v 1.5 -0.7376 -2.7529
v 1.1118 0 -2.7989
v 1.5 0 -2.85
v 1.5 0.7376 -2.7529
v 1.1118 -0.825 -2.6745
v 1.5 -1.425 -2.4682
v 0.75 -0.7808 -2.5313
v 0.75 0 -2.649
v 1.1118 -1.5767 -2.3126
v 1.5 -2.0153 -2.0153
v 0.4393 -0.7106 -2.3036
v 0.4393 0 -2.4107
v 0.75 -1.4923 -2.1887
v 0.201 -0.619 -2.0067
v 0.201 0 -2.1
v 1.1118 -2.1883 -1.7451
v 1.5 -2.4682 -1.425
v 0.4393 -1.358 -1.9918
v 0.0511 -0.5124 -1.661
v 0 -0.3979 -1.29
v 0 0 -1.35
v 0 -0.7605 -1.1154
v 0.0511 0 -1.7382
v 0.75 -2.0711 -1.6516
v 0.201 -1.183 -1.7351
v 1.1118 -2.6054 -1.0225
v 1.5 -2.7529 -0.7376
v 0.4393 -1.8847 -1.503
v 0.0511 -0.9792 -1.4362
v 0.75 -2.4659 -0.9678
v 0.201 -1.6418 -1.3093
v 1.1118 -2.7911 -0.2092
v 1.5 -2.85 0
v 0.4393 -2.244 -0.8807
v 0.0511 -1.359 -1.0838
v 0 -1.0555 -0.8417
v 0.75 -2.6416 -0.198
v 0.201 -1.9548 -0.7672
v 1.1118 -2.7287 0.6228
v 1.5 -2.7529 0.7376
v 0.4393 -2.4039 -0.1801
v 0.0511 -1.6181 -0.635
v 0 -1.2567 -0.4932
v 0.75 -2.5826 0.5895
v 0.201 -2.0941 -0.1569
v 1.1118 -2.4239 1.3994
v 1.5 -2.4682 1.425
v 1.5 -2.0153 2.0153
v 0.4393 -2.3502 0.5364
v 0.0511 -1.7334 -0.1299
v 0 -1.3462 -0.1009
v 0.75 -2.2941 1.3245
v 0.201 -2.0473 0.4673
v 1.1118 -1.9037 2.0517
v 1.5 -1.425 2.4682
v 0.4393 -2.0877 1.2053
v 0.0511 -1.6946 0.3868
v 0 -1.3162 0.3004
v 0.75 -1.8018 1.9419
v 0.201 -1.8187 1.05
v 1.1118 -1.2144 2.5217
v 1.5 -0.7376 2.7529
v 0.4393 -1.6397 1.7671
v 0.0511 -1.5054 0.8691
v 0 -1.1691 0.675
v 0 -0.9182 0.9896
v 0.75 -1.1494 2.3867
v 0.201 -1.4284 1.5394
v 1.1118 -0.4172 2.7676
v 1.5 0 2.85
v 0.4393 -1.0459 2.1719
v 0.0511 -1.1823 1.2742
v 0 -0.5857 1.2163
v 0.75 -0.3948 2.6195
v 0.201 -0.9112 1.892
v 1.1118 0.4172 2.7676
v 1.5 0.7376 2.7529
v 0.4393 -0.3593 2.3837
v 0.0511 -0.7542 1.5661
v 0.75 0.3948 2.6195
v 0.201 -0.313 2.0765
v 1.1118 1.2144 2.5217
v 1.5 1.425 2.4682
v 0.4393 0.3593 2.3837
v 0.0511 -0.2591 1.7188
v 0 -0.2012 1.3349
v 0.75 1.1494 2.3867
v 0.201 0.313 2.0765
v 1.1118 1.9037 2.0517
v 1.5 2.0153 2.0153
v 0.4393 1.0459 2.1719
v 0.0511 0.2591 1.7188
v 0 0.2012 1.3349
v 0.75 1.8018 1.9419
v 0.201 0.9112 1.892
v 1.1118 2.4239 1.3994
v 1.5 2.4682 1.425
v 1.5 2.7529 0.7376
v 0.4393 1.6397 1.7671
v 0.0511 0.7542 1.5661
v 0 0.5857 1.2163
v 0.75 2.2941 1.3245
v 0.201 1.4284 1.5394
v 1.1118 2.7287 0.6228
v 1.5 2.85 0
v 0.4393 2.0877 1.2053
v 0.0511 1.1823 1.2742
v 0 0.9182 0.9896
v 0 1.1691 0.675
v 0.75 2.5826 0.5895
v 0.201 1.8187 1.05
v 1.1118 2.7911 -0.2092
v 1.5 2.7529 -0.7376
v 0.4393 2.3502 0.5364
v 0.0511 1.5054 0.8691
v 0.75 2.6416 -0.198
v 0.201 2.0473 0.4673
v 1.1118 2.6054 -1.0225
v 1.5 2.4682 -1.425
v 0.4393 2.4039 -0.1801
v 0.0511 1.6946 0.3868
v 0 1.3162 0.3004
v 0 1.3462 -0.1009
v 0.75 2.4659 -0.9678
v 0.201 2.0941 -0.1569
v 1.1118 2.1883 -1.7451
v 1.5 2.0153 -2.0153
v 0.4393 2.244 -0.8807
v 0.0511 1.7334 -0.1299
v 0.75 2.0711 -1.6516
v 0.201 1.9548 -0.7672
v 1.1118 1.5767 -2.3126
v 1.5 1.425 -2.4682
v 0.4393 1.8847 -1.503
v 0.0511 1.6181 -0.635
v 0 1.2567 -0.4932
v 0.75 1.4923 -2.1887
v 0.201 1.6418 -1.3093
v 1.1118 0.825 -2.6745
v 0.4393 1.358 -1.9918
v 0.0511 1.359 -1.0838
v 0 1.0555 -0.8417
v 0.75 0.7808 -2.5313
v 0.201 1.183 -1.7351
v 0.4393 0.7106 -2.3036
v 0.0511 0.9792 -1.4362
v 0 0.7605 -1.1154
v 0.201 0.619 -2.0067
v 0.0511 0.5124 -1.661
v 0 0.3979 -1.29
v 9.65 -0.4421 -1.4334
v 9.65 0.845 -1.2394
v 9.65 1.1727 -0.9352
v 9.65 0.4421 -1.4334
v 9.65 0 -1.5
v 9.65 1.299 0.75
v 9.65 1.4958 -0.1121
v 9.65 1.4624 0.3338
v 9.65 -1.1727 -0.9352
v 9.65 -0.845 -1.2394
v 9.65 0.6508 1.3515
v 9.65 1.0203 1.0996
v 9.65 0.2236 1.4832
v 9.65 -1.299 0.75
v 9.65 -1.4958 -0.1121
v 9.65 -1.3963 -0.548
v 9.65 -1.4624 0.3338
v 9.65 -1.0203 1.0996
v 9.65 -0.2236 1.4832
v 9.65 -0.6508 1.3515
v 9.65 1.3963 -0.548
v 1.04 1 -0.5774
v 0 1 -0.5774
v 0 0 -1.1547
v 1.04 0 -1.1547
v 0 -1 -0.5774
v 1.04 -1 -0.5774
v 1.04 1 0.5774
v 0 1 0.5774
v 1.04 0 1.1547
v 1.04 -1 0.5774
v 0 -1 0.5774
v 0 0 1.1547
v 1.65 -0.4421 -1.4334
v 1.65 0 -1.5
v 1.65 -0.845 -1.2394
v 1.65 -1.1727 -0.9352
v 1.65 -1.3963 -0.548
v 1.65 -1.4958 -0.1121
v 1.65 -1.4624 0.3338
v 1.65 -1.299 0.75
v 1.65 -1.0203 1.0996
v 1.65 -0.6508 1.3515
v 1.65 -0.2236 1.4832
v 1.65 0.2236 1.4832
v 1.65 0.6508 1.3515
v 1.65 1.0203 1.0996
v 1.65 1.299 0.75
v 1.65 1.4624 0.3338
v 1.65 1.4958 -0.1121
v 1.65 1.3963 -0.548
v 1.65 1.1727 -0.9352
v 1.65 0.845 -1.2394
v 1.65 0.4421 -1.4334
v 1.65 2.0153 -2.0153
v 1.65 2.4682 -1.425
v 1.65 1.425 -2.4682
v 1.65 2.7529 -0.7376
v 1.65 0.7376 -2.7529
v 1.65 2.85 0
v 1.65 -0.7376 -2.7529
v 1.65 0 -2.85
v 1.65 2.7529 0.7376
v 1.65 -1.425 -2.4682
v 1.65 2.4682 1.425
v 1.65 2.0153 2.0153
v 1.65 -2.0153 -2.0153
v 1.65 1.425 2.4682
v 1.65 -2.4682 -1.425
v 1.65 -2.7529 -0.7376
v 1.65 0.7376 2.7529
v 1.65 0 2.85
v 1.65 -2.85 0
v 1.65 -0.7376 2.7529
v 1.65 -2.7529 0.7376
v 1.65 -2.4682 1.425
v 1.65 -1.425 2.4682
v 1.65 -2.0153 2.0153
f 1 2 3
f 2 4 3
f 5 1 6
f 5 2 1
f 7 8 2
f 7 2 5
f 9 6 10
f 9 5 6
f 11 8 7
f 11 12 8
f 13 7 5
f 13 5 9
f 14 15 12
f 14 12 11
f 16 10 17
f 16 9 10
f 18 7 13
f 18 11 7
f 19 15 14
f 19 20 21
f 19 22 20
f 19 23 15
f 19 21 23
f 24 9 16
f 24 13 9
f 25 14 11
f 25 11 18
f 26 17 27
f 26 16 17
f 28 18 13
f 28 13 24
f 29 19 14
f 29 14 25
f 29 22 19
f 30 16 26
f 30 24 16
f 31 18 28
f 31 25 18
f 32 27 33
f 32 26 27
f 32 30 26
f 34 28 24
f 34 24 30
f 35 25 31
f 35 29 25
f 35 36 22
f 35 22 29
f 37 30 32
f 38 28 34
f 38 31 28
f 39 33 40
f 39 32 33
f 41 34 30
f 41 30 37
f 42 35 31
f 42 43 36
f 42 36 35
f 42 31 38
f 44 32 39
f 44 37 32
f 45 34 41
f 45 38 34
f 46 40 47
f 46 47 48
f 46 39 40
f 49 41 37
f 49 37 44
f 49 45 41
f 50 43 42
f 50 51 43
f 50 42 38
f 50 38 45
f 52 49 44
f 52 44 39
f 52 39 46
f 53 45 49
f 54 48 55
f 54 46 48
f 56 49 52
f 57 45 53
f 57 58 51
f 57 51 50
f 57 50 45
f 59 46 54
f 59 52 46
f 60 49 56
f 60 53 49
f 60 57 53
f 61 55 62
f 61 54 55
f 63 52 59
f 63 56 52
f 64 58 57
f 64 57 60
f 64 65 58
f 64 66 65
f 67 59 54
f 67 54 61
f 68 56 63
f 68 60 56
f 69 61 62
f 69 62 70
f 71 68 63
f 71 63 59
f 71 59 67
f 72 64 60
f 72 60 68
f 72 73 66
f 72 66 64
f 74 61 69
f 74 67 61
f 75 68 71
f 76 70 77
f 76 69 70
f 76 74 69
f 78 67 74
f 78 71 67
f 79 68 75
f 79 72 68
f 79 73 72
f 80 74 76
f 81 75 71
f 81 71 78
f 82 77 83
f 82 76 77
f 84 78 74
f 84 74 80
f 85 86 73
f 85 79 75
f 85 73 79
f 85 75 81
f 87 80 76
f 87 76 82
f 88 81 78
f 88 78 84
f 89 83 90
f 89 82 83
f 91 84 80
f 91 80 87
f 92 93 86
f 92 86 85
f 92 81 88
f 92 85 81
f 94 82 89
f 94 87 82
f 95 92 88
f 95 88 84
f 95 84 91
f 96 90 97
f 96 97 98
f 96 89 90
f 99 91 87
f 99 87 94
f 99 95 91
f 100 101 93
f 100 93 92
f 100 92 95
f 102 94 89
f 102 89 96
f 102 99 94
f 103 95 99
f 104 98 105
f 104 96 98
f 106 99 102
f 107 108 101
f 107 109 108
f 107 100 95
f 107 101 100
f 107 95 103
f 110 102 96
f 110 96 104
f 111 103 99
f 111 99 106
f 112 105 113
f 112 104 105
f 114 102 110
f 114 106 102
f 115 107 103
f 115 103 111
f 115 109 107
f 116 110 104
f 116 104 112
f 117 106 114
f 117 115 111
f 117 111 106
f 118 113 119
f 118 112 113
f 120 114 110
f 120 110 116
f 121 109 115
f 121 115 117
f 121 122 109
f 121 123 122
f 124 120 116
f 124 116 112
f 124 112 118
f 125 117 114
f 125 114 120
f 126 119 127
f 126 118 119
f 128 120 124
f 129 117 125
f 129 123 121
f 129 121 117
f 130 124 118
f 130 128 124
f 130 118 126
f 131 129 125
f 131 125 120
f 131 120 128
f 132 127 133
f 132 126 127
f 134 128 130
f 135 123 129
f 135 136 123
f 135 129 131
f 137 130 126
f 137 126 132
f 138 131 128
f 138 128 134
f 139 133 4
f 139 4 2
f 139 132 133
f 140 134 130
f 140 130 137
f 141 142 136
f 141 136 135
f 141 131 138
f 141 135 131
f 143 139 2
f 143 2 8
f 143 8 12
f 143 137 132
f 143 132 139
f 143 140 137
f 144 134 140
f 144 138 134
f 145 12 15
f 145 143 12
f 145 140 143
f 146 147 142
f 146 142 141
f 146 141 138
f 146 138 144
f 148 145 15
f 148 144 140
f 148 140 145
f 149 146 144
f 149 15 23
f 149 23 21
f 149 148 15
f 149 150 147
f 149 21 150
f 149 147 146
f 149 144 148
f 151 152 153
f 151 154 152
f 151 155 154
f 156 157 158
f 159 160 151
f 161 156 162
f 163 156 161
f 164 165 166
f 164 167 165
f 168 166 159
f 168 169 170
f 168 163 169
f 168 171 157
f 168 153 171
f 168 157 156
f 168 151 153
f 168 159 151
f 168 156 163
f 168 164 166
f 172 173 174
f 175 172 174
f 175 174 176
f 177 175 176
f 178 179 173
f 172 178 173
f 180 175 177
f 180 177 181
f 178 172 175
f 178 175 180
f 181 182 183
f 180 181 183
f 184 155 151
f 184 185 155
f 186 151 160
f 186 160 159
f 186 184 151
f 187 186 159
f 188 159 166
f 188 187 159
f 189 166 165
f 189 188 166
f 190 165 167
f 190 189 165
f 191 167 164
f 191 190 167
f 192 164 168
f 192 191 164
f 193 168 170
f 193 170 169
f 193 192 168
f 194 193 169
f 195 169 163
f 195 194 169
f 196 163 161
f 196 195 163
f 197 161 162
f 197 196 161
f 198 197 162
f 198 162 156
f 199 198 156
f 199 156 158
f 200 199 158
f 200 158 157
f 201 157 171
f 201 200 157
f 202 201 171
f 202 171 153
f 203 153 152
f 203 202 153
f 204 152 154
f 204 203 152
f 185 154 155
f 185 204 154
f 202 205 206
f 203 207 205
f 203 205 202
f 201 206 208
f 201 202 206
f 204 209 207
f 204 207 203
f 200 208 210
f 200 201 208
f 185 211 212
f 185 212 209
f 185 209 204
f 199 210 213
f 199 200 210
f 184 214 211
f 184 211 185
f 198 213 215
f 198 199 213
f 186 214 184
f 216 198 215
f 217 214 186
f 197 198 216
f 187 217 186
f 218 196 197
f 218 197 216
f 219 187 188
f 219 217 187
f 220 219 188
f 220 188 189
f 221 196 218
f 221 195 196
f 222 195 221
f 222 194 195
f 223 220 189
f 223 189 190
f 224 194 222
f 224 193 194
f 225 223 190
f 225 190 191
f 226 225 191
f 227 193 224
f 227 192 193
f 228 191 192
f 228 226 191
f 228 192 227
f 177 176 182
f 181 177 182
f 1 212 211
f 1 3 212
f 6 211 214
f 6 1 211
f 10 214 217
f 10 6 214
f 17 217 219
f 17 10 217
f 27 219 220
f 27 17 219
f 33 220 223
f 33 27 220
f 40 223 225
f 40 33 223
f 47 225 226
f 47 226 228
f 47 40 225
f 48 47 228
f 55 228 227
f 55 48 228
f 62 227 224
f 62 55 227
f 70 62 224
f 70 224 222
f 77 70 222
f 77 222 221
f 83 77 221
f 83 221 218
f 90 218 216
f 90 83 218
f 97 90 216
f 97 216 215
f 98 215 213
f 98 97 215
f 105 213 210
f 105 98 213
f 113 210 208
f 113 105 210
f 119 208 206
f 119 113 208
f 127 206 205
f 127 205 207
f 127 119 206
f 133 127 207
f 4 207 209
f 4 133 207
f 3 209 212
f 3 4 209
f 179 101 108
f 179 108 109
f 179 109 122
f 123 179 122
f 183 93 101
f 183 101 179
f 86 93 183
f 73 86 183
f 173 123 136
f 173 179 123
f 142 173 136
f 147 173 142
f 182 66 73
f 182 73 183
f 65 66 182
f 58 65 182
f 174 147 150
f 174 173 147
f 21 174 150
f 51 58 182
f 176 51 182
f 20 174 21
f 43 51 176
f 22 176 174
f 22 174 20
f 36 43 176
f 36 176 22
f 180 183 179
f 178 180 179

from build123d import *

# Parameters (mm, degrees)
CUT_EXTRUDE1_DEPTH = 1.04


with BuildPart() as part:
    # Sketch1 → Revolve1 (revolve)
    with BuildSketch(Plane(origin=(0, 0, 0), x_dir=(1, 0, 0), z_dir=(0, 1, 0))):
        with BuildLine():
            Line((0, 0), (9.65, 0))
            Line((9.65, 0), (9.65, 1.5))
            Line((9.65, 1.5), (1.65, 1.5))
            Line((1.65, 1.5), (1.65, 2.85))
            Line((1.65, 2.85), (1.5, 2.85))
            ThreePointArc((1.5, 2.85), (0.439339828, 2.410660172), (0, 1.35))
            Line((0, 1.35), (0, 0))
        make_face()
    revolve(axis=Axis((0, 0, 0), (-1, 0, 0)))

    # Sketch2 → Cut-Extrude1 (cut)
    with BuildSketch(Plane.ZY):
        Polygon((1.154700538, 0), (0.577350269, 1), (-0.577350269, 1), (-1.154700538, 0), (-0.577350269, -1), (0.577350269, -1), align=None)
    extrude(amount=-CUT_EXTRUDE1_DEPTH, mode=Mode.SUBTRACT)


solid = part.part
